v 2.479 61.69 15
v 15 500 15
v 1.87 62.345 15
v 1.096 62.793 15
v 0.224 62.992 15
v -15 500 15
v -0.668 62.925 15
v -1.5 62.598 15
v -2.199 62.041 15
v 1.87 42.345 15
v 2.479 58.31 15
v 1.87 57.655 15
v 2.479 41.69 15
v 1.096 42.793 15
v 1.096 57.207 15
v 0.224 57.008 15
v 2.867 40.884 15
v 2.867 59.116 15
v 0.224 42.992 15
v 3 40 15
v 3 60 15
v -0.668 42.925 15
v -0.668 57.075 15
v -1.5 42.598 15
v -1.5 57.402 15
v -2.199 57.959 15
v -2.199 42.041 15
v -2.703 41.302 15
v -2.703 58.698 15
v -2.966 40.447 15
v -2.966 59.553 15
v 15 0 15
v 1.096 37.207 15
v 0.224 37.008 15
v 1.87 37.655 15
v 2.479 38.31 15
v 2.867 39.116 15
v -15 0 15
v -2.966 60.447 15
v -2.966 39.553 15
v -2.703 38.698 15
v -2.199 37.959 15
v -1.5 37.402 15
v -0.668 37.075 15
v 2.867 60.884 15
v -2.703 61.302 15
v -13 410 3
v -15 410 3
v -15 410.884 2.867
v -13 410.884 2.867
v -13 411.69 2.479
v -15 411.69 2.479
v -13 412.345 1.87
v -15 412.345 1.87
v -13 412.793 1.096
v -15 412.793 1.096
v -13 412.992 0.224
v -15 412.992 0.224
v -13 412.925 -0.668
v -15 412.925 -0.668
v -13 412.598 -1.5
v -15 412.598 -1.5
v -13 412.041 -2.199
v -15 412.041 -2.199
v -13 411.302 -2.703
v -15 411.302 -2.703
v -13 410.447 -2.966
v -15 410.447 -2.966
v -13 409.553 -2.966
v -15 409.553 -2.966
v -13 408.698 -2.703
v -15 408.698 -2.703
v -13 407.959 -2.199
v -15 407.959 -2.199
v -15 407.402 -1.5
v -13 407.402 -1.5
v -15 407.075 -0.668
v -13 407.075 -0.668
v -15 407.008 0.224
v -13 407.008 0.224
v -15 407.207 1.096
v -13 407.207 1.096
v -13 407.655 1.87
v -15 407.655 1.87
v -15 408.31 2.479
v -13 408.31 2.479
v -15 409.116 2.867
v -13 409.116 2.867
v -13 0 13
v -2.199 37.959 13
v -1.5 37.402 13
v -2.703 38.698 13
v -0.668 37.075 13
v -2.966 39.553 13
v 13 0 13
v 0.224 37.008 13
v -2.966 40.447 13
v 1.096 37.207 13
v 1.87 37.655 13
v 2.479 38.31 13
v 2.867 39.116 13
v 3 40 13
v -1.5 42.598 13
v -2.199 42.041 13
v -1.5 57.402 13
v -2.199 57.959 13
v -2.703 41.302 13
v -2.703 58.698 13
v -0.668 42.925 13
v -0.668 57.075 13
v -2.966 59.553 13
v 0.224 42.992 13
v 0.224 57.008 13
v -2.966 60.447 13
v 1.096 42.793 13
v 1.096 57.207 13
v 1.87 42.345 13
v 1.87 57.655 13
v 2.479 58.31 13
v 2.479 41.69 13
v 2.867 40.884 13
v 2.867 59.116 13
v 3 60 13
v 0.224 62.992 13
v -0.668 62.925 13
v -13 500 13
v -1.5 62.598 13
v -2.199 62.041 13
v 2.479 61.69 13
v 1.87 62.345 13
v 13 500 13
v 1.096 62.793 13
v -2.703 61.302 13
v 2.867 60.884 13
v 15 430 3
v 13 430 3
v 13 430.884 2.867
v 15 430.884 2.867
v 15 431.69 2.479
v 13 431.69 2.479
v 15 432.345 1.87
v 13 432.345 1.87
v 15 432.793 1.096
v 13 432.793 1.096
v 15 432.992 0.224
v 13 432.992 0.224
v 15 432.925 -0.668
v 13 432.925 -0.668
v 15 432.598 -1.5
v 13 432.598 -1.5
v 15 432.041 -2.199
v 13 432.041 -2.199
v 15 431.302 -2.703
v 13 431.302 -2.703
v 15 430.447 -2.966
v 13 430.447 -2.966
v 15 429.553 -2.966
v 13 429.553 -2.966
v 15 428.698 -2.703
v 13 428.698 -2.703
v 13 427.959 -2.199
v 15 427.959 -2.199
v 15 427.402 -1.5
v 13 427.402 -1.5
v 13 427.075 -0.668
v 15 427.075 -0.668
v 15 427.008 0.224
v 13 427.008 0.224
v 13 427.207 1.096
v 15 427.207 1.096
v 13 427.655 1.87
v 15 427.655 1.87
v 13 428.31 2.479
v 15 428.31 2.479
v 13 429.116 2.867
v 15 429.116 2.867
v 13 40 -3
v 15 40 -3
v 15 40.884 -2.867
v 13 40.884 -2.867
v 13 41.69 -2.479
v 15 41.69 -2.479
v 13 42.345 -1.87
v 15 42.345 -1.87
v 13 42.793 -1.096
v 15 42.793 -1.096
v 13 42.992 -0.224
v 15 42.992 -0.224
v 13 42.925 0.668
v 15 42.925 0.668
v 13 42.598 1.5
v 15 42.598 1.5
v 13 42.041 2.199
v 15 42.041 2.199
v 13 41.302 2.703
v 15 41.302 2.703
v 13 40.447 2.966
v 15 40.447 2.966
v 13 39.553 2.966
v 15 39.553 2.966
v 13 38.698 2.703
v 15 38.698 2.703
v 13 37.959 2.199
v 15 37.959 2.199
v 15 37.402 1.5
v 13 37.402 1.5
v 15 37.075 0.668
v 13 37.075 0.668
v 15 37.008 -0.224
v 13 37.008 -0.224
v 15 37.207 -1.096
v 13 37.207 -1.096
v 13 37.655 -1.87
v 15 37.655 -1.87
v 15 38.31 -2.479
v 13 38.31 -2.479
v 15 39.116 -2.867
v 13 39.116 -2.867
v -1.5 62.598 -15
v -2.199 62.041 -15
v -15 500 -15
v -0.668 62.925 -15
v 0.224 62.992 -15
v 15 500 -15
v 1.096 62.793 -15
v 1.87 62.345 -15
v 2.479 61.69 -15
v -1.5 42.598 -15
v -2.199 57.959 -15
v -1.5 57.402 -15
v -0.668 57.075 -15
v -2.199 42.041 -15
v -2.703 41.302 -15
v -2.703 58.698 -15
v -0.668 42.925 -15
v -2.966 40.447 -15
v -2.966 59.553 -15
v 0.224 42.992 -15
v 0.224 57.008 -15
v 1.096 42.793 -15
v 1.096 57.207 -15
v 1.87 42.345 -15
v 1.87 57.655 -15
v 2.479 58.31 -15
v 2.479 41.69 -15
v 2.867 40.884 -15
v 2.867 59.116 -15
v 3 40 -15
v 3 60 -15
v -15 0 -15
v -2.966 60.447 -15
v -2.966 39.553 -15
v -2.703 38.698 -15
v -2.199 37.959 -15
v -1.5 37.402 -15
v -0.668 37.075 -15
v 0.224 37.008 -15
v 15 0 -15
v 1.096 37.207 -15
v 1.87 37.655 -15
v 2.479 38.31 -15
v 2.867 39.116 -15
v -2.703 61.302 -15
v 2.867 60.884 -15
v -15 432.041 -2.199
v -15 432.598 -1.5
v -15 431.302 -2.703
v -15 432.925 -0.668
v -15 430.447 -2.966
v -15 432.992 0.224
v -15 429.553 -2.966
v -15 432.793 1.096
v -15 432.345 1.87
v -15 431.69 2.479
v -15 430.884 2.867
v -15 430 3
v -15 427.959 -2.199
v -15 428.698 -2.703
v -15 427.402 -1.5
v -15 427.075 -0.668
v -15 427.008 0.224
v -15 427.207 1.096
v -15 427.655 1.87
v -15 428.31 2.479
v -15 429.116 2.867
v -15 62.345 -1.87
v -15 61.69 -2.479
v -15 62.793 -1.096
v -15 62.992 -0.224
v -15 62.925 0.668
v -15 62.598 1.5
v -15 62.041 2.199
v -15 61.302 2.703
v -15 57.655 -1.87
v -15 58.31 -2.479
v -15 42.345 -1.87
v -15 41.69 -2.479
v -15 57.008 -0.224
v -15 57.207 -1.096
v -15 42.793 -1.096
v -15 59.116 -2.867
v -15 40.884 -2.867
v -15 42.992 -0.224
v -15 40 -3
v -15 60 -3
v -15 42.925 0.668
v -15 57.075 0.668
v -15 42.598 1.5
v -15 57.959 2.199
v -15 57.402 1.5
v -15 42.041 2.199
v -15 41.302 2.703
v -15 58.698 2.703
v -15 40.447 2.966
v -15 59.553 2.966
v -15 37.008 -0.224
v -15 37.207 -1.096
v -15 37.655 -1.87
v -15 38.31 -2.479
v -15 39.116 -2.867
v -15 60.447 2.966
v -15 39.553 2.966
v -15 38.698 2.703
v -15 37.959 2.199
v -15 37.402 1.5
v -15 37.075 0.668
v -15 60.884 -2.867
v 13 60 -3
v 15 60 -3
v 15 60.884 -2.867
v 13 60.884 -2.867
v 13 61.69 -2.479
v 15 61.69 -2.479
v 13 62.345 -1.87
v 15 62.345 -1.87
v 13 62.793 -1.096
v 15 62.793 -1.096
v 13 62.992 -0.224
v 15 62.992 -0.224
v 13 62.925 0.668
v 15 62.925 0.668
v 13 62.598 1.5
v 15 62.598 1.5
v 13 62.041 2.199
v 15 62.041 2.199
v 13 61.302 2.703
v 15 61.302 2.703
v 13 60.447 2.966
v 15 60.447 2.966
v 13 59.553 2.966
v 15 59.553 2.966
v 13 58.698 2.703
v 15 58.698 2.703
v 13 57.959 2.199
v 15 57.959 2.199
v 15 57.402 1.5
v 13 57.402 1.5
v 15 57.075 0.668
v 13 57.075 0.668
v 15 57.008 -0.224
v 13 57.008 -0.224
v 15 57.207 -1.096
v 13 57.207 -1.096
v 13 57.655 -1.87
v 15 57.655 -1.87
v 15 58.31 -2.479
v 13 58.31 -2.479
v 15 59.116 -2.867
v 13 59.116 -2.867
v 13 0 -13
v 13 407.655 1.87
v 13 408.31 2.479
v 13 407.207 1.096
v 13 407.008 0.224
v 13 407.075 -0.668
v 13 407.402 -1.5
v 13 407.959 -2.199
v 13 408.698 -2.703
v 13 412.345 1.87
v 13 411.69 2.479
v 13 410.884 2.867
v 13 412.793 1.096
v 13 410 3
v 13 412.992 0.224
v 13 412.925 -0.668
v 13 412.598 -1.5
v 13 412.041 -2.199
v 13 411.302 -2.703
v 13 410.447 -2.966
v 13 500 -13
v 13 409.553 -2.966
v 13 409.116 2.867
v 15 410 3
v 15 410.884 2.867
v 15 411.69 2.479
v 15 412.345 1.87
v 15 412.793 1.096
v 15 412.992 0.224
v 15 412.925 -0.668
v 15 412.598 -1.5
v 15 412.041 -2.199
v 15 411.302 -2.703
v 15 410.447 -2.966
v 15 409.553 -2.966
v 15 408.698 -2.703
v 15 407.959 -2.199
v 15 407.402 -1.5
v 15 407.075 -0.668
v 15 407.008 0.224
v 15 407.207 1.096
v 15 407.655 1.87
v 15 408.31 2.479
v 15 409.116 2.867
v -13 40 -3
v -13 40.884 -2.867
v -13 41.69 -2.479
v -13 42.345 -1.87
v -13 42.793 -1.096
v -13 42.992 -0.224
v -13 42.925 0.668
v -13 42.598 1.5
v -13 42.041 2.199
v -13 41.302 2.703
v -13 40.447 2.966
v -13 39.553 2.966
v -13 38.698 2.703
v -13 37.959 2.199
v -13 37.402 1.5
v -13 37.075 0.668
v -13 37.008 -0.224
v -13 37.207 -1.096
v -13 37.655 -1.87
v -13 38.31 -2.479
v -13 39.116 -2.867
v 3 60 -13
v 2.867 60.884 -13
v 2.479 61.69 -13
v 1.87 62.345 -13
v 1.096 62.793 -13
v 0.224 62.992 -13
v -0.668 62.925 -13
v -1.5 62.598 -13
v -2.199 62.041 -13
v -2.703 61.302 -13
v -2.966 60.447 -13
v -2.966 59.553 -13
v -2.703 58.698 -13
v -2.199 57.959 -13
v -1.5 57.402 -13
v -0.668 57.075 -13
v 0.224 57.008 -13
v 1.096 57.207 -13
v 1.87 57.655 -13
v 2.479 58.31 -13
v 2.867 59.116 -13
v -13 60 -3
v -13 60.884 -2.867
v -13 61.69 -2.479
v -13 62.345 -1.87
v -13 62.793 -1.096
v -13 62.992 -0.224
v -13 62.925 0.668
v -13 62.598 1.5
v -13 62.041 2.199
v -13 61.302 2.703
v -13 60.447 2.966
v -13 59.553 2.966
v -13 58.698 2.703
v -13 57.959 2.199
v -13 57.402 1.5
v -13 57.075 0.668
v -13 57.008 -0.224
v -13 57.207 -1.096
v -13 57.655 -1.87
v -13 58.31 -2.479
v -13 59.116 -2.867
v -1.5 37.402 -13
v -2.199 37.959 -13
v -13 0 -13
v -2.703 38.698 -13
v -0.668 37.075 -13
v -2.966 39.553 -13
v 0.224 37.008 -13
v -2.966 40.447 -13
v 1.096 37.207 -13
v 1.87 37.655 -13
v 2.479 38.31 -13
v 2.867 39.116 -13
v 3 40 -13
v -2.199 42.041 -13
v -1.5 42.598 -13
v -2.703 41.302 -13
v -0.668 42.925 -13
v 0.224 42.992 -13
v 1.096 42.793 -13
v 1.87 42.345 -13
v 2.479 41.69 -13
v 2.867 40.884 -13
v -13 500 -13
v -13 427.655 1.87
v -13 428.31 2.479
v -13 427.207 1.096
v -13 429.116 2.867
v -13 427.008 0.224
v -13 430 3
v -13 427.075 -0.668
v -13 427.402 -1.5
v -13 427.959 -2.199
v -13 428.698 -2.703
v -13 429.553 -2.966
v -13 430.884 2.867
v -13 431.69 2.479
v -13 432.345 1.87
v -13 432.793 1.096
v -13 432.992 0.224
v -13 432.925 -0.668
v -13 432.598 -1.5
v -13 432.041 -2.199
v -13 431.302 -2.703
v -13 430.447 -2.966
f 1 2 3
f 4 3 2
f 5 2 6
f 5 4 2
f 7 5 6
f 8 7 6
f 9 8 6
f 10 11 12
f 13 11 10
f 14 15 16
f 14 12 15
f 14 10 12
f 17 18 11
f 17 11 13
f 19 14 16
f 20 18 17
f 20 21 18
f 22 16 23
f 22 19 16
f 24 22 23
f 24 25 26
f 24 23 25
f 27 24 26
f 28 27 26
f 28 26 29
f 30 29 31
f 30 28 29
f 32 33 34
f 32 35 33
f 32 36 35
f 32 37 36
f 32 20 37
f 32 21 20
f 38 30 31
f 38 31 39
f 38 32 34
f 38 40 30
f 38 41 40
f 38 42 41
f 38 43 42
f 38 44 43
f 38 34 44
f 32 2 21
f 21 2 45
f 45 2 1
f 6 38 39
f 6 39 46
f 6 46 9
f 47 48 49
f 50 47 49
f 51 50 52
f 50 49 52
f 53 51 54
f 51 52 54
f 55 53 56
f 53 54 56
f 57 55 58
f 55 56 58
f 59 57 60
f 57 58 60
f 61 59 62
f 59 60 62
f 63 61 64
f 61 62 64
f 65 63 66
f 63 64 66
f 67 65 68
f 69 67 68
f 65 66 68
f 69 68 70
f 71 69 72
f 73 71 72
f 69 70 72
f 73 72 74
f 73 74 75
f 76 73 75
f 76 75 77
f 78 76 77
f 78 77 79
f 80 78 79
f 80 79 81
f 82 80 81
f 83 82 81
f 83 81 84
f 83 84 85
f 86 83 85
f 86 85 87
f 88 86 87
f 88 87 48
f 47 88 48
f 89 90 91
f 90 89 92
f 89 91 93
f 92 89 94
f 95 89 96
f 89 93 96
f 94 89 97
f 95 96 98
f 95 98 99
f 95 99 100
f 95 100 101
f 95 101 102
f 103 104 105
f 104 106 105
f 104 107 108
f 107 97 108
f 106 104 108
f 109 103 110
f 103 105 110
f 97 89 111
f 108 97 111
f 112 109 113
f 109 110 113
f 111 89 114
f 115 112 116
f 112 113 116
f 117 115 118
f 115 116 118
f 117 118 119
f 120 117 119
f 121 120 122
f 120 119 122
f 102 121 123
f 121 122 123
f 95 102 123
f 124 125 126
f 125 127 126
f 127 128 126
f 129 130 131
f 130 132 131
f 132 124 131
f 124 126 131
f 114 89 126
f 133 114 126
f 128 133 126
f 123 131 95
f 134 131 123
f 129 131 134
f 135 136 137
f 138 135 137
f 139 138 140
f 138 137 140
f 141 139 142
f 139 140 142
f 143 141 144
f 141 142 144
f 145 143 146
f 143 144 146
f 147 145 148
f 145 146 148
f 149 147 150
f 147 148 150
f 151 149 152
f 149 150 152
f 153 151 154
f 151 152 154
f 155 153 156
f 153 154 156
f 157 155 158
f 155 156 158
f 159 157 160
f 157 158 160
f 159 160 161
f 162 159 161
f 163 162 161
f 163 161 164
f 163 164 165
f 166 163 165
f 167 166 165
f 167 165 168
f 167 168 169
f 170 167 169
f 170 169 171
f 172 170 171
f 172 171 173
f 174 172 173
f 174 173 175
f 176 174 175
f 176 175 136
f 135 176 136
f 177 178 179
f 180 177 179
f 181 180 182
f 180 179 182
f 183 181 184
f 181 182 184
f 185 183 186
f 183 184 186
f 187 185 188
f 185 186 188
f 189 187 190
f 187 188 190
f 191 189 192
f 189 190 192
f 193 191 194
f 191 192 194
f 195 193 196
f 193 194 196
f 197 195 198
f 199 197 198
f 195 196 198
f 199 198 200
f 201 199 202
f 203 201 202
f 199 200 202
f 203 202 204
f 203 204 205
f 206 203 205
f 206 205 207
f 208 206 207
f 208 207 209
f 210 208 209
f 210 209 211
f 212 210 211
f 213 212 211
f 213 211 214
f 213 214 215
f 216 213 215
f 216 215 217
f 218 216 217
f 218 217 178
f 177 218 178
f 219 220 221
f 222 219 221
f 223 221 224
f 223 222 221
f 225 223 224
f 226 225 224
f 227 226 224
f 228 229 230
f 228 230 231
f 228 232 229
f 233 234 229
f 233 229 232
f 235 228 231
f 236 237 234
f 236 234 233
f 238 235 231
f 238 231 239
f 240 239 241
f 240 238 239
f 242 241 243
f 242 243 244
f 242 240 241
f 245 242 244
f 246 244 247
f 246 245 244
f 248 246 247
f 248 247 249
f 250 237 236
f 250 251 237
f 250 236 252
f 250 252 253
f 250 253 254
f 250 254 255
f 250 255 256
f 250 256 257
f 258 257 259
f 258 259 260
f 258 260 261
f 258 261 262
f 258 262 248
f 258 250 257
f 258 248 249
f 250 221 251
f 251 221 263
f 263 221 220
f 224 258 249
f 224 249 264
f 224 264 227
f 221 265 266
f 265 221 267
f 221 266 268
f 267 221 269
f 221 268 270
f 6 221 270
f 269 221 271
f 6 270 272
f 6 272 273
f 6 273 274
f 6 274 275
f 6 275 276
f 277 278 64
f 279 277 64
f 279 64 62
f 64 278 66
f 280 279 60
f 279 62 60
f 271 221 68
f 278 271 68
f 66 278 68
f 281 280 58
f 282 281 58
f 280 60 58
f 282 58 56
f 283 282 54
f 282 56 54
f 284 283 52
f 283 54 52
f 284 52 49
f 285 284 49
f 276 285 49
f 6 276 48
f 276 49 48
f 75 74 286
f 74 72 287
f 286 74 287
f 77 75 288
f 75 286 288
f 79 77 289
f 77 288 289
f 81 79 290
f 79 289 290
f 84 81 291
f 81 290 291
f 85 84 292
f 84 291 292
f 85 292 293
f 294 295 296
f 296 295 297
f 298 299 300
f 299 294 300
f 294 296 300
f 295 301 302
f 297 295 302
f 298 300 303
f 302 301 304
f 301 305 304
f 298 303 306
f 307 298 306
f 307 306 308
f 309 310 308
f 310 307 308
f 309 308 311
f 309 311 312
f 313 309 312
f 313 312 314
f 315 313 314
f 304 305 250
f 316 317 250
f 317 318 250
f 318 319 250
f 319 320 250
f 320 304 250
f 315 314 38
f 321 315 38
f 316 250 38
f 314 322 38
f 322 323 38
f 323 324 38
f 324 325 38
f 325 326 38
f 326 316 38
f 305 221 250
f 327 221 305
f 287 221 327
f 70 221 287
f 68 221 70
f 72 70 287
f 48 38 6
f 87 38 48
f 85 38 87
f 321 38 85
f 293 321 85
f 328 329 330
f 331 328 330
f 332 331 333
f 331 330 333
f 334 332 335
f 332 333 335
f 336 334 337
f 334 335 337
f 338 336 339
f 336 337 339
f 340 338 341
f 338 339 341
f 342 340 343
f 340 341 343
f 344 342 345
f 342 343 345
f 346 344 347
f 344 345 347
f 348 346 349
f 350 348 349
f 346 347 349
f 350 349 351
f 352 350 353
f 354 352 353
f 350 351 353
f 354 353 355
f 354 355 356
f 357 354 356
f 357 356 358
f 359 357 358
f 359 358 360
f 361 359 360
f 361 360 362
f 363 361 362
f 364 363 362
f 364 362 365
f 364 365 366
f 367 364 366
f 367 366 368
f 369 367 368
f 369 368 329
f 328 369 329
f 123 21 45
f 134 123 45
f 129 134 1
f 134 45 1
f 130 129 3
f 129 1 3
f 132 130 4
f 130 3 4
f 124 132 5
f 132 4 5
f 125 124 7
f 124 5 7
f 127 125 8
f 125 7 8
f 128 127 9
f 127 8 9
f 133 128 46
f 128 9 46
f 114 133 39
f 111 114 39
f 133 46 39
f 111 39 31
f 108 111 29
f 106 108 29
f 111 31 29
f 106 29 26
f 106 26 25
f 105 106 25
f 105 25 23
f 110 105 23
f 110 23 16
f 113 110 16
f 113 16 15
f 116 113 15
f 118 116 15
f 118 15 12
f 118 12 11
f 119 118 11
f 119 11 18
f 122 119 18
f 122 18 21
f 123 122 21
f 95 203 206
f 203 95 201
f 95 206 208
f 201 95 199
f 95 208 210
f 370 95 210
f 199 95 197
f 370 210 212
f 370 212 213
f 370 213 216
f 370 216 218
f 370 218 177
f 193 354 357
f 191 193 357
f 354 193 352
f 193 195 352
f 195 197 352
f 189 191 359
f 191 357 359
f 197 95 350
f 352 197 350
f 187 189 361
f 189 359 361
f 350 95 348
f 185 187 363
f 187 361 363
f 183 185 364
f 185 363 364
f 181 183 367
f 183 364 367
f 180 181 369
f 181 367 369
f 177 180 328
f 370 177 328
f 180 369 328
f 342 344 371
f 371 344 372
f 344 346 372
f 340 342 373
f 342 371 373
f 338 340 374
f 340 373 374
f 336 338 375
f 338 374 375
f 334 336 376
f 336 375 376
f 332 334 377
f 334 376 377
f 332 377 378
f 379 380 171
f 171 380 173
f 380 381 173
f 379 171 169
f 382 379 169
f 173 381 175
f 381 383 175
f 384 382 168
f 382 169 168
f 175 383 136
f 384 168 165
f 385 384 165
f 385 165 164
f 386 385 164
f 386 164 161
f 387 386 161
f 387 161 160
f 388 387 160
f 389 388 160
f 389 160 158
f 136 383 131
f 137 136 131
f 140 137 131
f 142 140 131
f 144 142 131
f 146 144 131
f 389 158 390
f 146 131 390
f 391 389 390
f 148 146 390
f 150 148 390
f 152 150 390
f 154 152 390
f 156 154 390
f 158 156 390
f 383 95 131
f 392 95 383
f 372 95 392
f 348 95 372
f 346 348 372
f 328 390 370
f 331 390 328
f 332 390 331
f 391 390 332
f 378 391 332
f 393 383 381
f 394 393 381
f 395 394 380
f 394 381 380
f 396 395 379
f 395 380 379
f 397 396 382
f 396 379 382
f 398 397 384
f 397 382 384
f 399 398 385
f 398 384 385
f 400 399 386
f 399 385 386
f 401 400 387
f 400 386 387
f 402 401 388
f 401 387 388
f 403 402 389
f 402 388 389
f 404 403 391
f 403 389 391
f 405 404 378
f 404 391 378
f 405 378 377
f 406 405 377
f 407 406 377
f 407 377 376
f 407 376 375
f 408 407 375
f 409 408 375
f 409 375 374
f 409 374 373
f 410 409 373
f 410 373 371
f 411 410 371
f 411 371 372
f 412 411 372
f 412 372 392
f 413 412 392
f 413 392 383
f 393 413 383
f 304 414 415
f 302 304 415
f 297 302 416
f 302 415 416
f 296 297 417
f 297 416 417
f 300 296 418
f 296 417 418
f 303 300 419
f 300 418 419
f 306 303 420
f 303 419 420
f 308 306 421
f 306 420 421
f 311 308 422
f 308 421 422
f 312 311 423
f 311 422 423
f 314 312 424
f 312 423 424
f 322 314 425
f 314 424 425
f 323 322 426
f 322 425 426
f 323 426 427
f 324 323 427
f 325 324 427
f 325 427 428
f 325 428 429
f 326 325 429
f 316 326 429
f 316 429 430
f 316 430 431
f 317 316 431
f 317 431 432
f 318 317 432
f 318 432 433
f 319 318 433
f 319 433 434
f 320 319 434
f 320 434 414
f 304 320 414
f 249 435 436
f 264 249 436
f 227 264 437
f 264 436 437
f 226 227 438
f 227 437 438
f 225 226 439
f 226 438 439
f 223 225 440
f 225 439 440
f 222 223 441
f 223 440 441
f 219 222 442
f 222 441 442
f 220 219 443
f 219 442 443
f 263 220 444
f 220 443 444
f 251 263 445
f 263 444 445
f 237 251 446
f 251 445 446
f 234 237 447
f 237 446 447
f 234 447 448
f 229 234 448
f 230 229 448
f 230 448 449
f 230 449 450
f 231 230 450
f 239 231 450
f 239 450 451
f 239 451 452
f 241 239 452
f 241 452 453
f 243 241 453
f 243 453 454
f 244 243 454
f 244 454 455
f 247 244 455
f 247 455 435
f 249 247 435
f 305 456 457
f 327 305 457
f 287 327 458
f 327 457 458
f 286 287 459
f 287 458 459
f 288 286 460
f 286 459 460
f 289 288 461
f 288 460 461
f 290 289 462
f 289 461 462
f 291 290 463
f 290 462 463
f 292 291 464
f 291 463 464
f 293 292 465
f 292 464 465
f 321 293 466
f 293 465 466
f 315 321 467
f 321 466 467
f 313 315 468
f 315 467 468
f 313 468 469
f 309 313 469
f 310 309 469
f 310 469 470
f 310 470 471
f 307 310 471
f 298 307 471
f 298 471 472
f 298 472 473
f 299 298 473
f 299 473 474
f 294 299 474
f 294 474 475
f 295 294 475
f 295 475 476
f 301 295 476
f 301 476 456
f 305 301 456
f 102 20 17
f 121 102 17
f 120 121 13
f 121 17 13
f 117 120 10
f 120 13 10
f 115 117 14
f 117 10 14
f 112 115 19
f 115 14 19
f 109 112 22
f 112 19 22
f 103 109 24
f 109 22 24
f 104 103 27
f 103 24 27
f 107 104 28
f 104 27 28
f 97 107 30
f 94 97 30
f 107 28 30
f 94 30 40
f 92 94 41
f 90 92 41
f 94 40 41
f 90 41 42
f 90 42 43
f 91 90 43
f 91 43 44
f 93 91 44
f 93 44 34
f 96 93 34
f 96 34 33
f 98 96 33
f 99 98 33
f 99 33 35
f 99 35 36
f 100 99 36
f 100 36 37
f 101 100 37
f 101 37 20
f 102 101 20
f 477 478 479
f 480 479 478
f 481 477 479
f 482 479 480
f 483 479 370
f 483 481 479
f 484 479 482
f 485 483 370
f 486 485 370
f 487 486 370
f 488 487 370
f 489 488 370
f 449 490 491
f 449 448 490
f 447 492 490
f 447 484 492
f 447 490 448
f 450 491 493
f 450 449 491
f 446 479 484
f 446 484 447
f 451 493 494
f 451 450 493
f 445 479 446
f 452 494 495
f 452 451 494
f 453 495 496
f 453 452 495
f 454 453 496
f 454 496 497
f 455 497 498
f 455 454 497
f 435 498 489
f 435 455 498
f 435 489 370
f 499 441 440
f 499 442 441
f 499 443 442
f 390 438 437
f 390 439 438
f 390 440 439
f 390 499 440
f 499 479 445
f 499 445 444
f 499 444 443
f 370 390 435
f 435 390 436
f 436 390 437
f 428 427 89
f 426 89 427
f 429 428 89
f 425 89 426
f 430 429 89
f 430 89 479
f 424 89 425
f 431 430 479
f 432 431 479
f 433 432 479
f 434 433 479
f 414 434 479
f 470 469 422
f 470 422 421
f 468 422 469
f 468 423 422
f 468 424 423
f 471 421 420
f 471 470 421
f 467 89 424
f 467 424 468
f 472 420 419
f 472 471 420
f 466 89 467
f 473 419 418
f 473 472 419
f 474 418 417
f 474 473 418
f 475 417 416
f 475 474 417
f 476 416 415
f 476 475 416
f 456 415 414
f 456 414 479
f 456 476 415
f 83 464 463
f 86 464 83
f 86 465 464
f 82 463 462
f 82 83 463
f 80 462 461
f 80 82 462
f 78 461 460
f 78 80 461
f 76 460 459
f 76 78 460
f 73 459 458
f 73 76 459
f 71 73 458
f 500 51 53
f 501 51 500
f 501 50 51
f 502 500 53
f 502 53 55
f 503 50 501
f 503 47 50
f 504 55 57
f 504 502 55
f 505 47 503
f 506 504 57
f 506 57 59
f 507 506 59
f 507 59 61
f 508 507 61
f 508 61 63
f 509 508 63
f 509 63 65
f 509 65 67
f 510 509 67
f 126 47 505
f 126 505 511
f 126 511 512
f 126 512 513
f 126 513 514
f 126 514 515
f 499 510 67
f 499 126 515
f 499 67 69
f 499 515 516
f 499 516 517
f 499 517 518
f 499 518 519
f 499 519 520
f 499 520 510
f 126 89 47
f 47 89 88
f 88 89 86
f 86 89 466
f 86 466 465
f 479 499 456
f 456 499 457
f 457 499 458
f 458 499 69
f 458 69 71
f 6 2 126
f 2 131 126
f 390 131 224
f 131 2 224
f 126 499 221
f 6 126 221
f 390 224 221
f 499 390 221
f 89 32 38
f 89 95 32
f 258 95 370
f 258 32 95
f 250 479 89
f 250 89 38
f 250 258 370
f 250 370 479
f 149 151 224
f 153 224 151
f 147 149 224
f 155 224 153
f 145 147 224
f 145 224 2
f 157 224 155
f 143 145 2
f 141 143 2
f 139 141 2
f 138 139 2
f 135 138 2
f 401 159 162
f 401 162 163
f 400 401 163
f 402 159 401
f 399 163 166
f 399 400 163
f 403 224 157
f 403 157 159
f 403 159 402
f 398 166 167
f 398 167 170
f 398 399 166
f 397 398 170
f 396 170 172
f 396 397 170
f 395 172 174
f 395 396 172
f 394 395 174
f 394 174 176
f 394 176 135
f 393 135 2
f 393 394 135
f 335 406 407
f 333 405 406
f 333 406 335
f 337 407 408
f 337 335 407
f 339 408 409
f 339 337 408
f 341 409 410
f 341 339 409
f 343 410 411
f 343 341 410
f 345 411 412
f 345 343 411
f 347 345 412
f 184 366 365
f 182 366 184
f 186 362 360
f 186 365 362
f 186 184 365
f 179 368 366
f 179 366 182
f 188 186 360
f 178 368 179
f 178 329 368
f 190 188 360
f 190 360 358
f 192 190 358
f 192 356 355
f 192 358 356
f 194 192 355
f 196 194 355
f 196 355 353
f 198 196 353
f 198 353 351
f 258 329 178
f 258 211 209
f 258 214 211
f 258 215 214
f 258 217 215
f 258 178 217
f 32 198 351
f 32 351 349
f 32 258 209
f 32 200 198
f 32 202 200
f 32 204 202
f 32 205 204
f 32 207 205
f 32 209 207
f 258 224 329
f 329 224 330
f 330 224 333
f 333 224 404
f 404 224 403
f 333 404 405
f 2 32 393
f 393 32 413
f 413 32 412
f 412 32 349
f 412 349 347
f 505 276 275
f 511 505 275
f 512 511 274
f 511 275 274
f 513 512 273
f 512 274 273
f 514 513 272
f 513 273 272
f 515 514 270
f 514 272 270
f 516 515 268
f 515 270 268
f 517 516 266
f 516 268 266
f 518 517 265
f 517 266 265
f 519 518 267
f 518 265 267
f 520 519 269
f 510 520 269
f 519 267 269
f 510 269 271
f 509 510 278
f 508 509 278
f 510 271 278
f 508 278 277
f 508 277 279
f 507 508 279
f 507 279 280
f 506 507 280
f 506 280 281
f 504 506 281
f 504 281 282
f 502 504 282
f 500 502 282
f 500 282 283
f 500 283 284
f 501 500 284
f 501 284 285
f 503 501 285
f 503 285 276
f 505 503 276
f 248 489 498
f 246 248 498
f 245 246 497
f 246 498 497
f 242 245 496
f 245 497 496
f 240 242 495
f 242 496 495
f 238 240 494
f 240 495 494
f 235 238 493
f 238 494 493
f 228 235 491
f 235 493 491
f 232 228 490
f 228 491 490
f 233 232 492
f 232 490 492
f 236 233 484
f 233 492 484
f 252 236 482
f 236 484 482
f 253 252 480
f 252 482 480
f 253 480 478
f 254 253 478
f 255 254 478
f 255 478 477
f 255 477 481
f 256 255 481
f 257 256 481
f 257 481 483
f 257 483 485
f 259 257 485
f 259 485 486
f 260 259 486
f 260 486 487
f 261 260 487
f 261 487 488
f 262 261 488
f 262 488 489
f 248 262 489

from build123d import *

# Parameters (mm, degrees)
BOSS_EXTRUDE1_DEPTH = 500
SKETCH3_W           = 26
SKETCH3_H           = 26
CUT_EXTRUDE1_DEPTH  = 500
SKETCH5_R           = 3
CUT_EXTRUDE2_DEPTH  = 30
SKETCH6_R           = 3
CUT_EXTRUDE3_DEPTH  = 30
SKETCH9_R           = 3
CUT_EXTRUDE6_DEPTH  = 30


with BuildPart() as part:
    # Sketch1 → Boss-Extrude1 (new body)
    with BuildSketch(Plane(origin=(0, 0, 0), x_dir=(1, 0, 0), z_dir=(0, 1, 0))):
        Polygon((-15, 0), (-15, 15), (15, 15), (15, -15), (-15, -15), align=None)
    extrude(amount=BOSS_EXTRUDE1_DEPTH)

    # Sketch3 → Cut-Extrude1 (cut)
    with BuildSketch(Plane(origin=(0, 500, 0), x_dir=(1, 0, 0), z_dir=(0, 1, 0))):
        Rectangle(SKETCH3_W, SKETCH3_H)
    extrude(amount=-CUT_EXTRUDE1_DEPTH, mode=Mode.SUBTRACT)

    # Sketch5 → Cut-Extrude2 (cut)
    with BuildSketch(Plane(origin=(15, 0, 0), x_dir=(0, 0, -1), z_dir=(1, 0, 0))):
        with Locations((0, 60)):
            Circle(SKETCH5_R)
        with Locations((0, 40)):
            Circle(SKETCH5_R)
    extrude(amount=-CUT_EXTRUDE2_DEPTH, mode=Mode.SUBTRACT)

    # Sketch6 → Cut-Extrude3 (cut)
    with BuildSketch(Plane.XY.offset(15)):
        with Locations((0, 40)):
            Circle(SKETCH6_R)
        with Locations((0, 60)):
            Circle(SKETCH6_R)
    extrude(amount=-CUT_EXTRUDE3_DEPTH, mode=Mode.SUBTRACT)

    # Sketch9 → Cut-Extrude6 (cut)
    with BuildSketch(Plane.ZY.offset(15)):
        with Locations((0, 430)):
            Circle(SKETCH9_R)
        with Locations((0, 410)):
            Circle(SKETCH9_R)
    extrude(amount=-CUT_EXTRUDE6_DEPTH, mode=Mode.SUBTRACT)


solid = part.part
